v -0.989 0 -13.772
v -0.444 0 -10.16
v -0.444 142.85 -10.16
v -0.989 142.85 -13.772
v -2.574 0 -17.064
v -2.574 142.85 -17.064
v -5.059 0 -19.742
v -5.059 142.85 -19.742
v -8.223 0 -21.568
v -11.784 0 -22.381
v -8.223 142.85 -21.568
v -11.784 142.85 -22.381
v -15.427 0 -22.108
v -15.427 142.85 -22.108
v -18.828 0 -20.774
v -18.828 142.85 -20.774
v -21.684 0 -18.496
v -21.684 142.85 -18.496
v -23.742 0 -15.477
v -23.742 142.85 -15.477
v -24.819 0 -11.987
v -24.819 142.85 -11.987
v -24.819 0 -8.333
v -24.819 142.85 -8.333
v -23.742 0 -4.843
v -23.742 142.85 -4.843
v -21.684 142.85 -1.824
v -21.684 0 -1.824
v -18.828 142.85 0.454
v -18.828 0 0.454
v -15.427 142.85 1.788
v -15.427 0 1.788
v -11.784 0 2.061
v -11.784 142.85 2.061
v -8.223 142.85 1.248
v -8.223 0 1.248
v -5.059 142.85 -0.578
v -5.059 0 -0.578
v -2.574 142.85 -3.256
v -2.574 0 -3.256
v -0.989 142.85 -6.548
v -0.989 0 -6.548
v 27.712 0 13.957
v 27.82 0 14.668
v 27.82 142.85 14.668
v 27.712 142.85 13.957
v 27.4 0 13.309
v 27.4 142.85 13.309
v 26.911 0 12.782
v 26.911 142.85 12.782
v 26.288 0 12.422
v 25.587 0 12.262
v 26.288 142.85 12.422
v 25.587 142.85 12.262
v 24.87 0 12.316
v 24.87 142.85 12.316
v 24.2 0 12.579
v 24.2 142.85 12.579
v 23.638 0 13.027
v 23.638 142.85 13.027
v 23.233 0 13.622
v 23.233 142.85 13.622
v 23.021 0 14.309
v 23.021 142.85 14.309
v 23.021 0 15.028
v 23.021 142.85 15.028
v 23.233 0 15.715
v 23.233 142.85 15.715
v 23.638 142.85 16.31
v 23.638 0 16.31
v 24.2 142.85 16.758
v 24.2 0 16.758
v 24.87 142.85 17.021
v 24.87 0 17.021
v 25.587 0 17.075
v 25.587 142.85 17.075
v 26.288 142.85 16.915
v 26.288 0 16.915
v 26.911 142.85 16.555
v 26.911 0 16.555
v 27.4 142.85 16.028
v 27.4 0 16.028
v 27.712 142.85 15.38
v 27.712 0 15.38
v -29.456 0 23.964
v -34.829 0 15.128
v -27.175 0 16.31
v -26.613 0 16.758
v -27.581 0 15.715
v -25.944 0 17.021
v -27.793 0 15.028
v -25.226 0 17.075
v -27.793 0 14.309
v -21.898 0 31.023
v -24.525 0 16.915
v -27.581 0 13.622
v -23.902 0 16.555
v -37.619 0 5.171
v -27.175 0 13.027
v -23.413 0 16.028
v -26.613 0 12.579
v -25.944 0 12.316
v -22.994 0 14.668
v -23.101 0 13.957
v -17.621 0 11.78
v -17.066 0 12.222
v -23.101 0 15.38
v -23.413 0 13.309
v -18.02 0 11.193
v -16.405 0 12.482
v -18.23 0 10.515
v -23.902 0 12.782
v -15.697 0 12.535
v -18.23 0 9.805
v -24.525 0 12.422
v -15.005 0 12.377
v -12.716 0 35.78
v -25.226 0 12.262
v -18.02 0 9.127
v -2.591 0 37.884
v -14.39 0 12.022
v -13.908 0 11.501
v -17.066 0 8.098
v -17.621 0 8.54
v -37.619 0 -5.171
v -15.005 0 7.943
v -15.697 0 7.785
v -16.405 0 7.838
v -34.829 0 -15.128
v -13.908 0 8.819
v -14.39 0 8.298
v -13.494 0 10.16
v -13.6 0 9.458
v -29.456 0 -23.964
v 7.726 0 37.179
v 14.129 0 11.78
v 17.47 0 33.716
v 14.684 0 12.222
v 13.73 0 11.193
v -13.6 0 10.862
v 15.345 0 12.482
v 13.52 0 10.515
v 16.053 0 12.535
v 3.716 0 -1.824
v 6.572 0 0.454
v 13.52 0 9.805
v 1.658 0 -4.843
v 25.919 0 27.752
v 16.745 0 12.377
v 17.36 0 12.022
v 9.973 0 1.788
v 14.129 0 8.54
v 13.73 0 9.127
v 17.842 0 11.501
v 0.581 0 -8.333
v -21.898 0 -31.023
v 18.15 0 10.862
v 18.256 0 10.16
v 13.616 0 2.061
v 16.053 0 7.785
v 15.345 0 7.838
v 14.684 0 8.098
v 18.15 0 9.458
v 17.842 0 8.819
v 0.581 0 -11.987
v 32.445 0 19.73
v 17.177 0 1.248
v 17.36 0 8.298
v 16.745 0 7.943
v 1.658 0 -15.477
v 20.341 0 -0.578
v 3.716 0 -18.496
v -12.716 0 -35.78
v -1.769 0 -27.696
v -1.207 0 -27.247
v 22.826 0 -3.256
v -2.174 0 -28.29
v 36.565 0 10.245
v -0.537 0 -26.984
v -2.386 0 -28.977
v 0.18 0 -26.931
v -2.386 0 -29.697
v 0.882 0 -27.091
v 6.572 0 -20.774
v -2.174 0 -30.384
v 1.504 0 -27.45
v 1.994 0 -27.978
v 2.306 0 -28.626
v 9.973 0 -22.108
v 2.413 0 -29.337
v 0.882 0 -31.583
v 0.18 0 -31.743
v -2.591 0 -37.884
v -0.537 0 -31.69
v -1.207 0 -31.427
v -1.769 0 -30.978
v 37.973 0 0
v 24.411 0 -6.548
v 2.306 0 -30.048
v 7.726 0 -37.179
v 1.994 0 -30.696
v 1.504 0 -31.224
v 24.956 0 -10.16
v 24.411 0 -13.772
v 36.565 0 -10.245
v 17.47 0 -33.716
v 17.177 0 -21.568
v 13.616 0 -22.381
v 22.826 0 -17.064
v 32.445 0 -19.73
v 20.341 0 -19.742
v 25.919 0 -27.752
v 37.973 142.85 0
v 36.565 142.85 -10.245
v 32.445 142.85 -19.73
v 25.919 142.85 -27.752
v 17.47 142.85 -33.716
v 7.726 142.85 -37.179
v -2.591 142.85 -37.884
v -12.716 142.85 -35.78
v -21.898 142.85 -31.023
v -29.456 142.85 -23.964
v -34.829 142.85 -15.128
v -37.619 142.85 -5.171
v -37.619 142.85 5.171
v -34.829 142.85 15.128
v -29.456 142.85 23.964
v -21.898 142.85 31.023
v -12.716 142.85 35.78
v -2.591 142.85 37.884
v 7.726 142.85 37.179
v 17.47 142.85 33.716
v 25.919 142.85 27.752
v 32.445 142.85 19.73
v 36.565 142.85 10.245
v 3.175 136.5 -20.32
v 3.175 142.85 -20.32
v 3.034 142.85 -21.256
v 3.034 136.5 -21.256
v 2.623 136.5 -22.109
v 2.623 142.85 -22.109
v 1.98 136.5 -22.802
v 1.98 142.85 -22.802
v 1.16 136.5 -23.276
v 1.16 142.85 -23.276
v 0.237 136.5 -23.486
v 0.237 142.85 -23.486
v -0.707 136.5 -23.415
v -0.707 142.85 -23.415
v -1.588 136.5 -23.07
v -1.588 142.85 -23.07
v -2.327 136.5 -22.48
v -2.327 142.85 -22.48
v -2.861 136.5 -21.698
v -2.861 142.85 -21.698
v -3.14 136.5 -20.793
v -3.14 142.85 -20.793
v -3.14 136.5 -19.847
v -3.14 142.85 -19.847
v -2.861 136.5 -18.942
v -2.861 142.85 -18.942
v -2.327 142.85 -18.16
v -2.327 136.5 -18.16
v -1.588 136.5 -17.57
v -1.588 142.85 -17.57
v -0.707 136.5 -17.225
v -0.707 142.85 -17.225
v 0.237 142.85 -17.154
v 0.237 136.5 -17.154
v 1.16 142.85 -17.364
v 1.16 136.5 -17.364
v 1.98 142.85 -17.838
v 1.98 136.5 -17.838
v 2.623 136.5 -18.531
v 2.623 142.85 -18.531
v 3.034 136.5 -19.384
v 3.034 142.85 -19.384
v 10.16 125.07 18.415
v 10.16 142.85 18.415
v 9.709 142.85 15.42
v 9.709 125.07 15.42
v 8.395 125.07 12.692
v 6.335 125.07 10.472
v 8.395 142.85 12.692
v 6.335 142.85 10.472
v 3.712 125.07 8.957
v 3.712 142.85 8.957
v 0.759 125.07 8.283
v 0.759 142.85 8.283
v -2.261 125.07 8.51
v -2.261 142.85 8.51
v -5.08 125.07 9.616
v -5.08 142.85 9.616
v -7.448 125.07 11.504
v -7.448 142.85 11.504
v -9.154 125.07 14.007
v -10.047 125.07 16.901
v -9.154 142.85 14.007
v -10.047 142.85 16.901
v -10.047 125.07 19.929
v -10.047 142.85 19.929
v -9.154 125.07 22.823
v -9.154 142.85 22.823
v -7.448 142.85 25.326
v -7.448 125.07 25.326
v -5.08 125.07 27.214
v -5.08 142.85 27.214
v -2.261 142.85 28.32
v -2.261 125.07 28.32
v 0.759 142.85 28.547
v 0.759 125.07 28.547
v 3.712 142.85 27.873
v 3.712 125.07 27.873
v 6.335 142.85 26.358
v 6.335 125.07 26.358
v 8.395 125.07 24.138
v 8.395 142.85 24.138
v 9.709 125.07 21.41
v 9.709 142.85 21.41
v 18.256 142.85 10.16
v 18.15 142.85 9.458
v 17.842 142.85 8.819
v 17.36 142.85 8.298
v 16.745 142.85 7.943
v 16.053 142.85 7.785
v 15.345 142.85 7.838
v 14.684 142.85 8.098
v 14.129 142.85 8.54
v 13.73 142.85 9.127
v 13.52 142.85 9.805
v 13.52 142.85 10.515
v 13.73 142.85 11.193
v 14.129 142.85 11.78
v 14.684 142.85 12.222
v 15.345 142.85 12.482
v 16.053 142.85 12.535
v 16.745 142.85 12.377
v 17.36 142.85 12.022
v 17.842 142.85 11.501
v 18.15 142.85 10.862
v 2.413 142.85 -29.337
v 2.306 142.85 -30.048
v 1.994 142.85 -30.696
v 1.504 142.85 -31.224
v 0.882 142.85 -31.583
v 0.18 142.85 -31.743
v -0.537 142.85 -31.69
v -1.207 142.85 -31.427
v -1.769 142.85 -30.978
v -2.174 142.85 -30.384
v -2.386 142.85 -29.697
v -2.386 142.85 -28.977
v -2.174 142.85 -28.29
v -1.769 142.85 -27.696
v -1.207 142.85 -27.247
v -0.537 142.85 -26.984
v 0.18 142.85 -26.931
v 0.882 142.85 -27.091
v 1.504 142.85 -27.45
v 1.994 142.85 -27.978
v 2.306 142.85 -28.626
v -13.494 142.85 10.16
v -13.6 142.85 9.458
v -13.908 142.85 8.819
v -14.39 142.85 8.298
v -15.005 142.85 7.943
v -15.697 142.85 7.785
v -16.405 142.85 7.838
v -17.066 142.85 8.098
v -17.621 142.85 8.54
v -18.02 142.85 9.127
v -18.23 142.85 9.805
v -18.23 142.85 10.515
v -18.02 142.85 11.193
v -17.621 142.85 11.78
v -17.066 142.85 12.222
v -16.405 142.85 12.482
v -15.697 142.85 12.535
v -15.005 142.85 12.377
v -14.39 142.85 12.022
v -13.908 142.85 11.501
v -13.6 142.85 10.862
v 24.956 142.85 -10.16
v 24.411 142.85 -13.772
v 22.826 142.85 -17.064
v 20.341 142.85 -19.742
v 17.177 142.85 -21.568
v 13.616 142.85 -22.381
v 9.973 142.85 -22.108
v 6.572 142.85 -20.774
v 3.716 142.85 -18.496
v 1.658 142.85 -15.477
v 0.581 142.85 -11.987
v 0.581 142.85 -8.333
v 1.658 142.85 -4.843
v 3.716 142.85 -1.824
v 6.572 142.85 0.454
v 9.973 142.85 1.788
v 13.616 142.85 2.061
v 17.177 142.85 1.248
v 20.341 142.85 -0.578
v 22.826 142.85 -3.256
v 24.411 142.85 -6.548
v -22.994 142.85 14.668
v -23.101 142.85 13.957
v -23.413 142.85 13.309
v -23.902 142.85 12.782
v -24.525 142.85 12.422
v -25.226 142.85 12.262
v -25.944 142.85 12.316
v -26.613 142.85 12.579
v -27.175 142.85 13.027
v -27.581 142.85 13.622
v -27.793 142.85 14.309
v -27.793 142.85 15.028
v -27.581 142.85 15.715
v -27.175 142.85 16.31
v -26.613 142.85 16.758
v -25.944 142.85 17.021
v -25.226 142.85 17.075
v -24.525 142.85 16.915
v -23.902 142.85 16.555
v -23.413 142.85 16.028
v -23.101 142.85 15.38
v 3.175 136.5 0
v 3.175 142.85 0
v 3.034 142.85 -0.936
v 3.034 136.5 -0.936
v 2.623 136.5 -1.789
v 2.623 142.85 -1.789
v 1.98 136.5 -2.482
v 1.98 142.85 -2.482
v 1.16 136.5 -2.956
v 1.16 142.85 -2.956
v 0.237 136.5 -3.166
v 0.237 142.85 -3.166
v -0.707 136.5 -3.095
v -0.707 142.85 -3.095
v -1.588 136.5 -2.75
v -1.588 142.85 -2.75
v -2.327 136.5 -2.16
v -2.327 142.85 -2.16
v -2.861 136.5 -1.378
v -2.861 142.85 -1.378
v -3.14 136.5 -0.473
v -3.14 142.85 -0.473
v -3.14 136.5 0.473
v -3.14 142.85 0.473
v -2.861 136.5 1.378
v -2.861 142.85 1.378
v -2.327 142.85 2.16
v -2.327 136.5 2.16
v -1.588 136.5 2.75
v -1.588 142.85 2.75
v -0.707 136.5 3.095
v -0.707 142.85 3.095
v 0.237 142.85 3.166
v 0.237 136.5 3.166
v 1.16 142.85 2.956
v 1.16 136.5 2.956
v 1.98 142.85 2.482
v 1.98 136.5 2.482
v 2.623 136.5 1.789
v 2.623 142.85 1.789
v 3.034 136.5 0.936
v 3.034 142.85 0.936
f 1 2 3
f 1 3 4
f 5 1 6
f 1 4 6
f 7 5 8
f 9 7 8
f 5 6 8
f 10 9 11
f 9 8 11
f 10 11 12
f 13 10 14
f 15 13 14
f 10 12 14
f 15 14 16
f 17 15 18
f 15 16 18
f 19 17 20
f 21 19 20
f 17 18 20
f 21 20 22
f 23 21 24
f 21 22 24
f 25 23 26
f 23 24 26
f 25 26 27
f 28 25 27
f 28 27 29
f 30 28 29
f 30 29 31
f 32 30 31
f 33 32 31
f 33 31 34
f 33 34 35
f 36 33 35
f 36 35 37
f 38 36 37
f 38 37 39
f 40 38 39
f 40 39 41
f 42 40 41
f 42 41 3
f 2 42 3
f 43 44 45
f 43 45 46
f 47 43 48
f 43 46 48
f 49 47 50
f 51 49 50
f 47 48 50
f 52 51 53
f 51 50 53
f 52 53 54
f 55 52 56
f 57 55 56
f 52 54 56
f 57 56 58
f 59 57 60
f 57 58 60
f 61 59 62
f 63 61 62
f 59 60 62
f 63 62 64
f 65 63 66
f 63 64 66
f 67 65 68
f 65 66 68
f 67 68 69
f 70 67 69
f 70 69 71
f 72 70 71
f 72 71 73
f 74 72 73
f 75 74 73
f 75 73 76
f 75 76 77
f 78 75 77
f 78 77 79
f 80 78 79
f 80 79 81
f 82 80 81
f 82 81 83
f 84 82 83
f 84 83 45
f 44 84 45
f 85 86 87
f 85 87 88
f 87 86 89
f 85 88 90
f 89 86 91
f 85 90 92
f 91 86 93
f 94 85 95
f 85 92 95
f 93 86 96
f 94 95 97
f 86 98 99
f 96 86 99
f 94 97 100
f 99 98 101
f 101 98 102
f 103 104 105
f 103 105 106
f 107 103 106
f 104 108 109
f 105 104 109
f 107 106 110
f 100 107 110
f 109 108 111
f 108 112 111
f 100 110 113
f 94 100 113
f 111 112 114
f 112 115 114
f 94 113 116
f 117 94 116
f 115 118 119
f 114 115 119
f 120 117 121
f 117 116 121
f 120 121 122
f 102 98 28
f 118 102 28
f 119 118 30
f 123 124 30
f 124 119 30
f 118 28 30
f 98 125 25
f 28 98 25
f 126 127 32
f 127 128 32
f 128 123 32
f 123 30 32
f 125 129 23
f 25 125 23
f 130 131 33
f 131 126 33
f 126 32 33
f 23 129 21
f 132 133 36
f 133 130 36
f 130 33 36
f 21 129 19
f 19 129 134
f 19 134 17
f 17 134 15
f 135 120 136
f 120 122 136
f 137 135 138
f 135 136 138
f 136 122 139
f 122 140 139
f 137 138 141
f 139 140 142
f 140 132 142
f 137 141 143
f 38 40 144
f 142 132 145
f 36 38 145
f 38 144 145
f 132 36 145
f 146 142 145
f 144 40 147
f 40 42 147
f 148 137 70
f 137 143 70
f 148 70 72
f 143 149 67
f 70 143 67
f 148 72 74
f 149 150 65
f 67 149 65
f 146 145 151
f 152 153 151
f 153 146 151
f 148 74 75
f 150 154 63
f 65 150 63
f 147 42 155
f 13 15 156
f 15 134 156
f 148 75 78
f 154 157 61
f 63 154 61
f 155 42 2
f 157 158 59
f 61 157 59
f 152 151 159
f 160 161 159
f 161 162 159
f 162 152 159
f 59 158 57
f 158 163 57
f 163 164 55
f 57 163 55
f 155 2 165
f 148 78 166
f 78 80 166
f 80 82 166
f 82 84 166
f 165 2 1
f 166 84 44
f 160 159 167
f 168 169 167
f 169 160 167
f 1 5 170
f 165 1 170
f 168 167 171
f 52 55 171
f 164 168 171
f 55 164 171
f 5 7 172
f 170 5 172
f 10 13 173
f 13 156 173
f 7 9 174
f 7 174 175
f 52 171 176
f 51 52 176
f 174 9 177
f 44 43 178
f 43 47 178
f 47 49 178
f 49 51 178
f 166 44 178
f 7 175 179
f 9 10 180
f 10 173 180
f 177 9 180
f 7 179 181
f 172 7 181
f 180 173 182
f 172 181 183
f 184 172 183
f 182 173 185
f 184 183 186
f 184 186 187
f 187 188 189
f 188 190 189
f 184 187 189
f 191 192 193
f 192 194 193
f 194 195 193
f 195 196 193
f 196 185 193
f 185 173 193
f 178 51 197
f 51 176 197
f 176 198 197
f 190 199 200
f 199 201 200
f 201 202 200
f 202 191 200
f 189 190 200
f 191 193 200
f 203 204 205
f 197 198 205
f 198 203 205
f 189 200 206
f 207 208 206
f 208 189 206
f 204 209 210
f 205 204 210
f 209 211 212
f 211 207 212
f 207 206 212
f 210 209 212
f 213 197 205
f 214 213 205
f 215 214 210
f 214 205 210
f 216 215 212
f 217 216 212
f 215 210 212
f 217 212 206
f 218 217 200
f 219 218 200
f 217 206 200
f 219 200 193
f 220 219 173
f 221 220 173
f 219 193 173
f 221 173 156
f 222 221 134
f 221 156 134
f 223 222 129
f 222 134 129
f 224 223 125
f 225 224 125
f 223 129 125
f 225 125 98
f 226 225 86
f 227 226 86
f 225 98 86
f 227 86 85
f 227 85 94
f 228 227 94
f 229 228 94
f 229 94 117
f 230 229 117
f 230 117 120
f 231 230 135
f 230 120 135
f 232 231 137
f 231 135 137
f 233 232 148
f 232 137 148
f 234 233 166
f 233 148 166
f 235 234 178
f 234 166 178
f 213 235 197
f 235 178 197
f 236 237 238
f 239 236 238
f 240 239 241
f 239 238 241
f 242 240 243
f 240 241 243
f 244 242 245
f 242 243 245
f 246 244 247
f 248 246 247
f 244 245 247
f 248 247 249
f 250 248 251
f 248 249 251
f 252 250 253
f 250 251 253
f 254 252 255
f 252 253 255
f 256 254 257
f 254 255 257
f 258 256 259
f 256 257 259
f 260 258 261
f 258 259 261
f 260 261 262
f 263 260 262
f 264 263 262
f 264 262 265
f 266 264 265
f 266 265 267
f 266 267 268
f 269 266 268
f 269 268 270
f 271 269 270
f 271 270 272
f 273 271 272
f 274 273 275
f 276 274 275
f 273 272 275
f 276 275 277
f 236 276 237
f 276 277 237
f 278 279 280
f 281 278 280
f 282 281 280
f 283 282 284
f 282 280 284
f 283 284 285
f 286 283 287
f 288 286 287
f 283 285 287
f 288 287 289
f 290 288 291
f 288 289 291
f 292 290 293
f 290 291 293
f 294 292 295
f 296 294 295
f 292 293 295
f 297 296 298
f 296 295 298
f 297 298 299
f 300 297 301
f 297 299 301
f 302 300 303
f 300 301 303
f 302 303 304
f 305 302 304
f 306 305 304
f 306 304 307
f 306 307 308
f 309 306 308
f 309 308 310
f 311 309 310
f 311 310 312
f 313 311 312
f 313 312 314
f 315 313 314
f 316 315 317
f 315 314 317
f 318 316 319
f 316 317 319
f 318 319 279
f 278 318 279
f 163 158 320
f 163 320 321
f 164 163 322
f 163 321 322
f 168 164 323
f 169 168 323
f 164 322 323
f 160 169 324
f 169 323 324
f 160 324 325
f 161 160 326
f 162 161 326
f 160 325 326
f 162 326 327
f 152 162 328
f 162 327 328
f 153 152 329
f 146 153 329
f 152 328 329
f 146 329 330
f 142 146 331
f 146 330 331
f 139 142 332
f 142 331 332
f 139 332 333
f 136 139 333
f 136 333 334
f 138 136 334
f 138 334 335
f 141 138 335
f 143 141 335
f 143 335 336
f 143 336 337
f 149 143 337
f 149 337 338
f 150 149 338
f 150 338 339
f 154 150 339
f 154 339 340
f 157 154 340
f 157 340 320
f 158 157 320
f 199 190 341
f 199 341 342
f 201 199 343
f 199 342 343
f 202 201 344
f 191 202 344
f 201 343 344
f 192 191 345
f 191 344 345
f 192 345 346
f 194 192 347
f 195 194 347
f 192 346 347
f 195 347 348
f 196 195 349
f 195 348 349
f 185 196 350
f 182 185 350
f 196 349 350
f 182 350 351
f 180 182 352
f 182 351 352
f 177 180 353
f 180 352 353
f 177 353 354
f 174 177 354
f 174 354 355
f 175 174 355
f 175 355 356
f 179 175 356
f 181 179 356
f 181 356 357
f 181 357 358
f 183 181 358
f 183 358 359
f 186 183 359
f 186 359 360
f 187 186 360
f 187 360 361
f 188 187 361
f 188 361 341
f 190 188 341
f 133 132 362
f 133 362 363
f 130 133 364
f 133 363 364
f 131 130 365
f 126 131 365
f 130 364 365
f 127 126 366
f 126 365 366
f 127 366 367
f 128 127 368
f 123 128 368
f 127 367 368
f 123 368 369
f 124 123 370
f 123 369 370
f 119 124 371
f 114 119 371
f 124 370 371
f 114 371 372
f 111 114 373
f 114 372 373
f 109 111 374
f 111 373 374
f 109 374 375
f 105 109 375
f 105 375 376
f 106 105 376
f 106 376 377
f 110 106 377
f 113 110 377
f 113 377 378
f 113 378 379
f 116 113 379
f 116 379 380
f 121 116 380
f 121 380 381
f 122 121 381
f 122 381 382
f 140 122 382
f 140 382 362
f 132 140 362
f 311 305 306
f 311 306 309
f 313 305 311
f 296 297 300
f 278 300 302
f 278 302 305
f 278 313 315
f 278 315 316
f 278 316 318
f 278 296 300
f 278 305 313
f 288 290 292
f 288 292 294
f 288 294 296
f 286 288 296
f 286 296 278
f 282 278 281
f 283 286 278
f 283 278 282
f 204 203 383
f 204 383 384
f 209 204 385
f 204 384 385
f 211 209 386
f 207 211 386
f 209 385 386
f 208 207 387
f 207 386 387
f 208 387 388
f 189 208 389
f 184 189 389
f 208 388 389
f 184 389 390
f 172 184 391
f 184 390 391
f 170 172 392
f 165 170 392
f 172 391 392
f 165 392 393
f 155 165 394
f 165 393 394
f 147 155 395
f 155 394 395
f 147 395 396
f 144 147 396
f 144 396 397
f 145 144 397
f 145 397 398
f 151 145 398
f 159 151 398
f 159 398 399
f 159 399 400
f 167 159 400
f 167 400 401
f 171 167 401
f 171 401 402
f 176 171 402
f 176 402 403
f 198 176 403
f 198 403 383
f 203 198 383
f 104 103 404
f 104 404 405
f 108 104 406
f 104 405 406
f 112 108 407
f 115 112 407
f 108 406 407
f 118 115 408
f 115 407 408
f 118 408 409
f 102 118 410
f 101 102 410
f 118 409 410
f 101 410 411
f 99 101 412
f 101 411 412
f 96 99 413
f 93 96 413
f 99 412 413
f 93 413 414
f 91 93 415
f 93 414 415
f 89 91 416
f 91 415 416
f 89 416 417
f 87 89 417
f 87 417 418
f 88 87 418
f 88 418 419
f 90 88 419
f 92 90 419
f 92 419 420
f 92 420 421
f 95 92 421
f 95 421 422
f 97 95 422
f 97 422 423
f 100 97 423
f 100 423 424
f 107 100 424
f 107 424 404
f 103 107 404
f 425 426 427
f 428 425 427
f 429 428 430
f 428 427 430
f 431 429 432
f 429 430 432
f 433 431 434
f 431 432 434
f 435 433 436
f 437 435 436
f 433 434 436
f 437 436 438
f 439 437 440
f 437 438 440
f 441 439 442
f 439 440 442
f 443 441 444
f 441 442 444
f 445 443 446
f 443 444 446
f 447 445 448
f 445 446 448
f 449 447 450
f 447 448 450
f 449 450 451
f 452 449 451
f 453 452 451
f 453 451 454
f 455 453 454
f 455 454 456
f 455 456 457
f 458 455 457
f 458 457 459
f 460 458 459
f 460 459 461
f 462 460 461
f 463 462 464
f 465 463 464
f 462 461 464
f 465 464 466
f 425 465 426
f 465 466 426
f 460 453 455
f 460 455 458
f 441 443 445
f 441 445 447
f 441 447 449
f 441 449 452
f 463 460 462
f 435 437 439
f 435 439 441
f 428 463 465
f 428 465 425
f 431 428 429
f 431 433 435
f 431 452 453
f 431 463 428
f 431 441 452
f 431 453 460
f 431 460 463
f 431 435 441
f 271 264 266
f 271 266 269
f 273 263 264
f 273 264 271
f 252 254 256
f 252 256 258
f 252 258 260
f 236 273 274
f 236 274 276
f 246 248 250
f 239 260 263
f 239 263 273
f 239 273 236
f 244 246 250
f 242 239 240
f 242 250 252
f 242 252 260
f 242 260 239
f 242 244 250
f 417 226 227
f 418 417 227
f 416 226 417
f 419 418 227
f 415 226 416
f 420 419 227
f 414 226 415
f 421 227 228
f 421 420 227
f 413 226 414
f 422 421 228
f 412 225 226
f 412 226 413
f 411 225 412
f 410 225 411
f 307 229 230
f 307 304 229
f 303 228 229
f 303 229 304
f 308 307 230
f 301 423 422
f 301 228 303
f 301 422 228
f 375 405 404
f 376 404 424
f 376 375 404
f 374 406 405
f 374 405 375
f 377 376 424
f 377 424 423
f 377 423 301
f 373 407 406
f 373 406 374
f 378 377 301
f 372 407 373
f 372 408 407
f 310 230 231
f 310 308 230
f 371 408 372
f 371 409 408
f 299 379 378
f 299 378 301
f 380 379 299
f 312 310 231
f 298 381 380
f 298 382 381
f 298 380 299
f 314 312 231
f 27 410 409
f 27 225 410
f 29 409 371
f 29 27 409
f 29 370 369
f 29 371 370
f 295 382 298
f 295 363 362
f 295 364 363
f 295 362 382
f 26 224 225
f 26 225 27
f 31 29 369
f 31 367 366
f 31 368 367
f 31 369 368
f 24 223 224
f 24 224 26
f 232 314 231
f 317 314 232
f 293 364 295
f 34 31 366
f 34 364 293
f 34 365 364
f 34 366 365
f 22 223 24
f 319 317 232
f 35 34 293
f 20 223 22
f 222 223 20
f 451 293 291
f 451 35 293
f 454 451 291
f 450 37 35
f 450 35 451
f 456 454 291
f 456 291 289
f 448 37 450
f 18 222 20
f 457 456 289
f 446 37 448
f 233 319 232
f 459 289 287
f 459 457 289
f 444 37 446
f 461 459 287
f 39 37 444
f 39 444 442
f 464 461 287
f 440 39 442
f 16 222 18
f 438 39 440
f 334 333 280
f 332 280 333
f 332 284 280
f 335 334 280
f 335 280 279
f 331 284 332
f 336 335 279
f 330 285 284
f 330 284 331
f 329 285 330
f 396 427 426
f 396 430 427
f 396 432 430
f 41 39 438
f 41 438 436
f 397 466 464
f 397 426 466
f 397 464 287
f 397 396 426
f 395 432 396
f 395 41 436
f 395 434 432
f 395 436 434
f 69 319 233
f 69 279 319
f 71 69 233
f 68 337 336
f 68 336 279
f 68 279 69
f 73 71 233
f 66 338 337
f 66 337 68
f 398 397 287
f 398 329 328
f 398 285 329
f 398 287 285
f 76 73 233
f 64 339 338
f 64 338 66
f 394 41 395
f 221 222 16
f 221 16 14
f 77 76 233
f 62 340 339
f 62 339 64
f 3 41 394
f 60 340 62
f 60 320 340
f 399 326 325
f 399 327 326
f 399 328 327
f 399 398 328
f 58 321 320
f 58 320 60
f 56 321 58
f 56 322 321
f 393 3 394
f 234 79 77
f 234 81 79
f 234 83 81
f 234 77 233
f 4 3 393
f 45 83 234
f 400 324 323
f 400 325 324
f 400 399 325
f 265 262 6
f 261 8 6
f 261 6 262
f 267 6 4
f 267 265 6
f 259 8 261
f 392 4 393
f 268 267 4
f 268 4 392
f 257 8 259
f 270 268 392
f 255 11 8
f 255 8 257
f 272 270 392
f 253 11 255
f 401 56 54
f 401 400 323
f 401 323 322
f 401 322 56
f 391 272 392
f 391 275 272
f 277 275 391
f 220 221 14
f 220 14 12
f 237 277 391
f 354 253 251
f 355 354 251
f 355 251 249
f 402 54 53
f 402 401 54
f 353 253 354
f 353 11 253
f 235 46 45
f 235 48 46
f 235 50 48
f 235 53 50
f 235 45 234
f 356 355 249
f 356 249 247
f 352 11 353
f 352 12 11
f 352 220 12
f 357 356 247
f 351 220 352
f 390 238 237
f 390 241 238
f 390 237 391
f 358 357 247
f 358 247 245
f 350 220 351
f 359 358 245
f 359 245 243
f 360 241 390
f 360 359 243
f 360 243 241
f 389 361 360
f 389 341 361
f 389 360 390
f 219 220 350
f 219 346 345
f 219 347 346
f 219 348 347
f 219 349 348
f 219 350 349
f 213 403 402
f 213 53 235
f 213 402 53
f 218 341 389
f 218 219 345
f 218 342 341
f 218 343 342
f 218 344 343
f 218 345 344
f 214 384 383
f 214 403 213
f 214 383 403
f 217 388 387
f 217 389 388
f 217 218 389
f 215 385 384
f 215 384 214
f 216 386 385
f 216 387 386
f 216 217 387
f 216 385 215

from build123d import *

# Parameters (mm, degrees)
SKETCH1_R               = 37.973
BOSS_EXTRUDE1_DEPTH     = 142.8496
SKETCH2_R               = 2.413
CUT_EXTRUDE1_DEPTH      = 143.8496
SKETCH3_R               = 12.2555
CUT_EXTRUDE2_DEPTH      = 143.8496
SKETCH4_R               = 3.175
CUT_EXTRUDE3_DEPTH      = 6.35
SKETCH5_R               = 10.16
CUT_EXTRUDE4_DEPTH      = 17.78
SKETCH6_R               = 2.38125
CUT_EXTRUDE5_DEPTH      = 1
CUT_EXTRUDE5_DEPTH_BACK = 143.8496


with BuildPart() as part:
    # Sketch1 → Boss-Extrude1 (new body)
    with BuildSketch(Plane(origin=(0, 0, 0), x_dir=(1, 0, 0), z_dir=(0, 1, 0))):
        Circle(SKETCH1_R)
    extrude(amount=BOSS_EXTRUDE1_DEPTH)

    # Sketch2 → Cut-Extrude1 (cut, through all)
    with BuildSketch(Plane(origin=(0, 142.8496, 0), x_dir=(1, 0, 0), z_dir=(0, 1, 0))):
        with Locations((0, 29.337)):
            Circle(SKETCH2_R)
        with Locations((25.406587271, -14.6685)):
            Circle(SKETCH2_R)
        with Locations((-25.406587271, -14.6685)):
            Circle(SKETCH2_R)
    extrude(amount=-CUT_EXTRUDE1_DEPTH, mode=Mode.SUBTRACT)

    # Sketch3 → Cut-Extrude2 (cut, through all)
    with BuildSketch(Plane(origin=(0, 142.8496, 0), x_dir=(1, 0, 0), z_dir=(0, 1, 0))):
        with Locations((-12.7, 10.16)):
            Circle(SKETCH3_R)
        with Locations((12.7, 10.16)):
            Circle(SKETCH3_R)
    extrude(amount=-CUT_EXTRUDE2_DEPTH, mode=Mode.SUBTRACT)

    # Sketch4 → Cut-Extrude3 (cut)
    with BuildSketch(Plane(origin=(0, 142.8496, 0), x_dir=(1, 0, 0), z_dir=(0, 1, 0))):
        with Locations((0, 20.32)):
            Circle(SKETCH4_R)
        Circle(SKETCH4_R)
    extrude(amount=-CUT_EXTRUDE3_DEPTH, mode=Mode.SUBTRACT)

    # Sketch5 → Cut-Extrude4 (cut)
    with BuildSketch(Plane(origin=(0, 142.8496, 0), x_dir=(1, 0, 0), z_dir=(0, 1, 0))):
        with Locations((0, -18.415)):
            Circle(SKETCH5_R)
    extrude(amount=-CUT_EXTRUDE4_DEPTH, mode=Mode.SUBTRACT)

    # Sketch6 → Cut-Extrude5 (cut, two sides)
    with BuildSketch(Plane(origin=(0, 142.8496, 0), x_dir=(1, 0, 0), z_dir=(0, 1, 0))) as cut_extrude5_sk:
        with Locations((15.875, -10.16)):
            Circle(SKETCH6_R)
        with Locations((-15.875, -10.16)):
            Circle(SKETCH6_R)
    extrude(amount=CUT_EXTRUDE5_DEPTH, mode=Mode.SUBTRACT)
    extrude(cut_extrude5_sk.sketch, amount=-CUT_EXTRUDE5_DEPTH_BACK, mode=Mode.SUBTRACT)


solid = part.part
